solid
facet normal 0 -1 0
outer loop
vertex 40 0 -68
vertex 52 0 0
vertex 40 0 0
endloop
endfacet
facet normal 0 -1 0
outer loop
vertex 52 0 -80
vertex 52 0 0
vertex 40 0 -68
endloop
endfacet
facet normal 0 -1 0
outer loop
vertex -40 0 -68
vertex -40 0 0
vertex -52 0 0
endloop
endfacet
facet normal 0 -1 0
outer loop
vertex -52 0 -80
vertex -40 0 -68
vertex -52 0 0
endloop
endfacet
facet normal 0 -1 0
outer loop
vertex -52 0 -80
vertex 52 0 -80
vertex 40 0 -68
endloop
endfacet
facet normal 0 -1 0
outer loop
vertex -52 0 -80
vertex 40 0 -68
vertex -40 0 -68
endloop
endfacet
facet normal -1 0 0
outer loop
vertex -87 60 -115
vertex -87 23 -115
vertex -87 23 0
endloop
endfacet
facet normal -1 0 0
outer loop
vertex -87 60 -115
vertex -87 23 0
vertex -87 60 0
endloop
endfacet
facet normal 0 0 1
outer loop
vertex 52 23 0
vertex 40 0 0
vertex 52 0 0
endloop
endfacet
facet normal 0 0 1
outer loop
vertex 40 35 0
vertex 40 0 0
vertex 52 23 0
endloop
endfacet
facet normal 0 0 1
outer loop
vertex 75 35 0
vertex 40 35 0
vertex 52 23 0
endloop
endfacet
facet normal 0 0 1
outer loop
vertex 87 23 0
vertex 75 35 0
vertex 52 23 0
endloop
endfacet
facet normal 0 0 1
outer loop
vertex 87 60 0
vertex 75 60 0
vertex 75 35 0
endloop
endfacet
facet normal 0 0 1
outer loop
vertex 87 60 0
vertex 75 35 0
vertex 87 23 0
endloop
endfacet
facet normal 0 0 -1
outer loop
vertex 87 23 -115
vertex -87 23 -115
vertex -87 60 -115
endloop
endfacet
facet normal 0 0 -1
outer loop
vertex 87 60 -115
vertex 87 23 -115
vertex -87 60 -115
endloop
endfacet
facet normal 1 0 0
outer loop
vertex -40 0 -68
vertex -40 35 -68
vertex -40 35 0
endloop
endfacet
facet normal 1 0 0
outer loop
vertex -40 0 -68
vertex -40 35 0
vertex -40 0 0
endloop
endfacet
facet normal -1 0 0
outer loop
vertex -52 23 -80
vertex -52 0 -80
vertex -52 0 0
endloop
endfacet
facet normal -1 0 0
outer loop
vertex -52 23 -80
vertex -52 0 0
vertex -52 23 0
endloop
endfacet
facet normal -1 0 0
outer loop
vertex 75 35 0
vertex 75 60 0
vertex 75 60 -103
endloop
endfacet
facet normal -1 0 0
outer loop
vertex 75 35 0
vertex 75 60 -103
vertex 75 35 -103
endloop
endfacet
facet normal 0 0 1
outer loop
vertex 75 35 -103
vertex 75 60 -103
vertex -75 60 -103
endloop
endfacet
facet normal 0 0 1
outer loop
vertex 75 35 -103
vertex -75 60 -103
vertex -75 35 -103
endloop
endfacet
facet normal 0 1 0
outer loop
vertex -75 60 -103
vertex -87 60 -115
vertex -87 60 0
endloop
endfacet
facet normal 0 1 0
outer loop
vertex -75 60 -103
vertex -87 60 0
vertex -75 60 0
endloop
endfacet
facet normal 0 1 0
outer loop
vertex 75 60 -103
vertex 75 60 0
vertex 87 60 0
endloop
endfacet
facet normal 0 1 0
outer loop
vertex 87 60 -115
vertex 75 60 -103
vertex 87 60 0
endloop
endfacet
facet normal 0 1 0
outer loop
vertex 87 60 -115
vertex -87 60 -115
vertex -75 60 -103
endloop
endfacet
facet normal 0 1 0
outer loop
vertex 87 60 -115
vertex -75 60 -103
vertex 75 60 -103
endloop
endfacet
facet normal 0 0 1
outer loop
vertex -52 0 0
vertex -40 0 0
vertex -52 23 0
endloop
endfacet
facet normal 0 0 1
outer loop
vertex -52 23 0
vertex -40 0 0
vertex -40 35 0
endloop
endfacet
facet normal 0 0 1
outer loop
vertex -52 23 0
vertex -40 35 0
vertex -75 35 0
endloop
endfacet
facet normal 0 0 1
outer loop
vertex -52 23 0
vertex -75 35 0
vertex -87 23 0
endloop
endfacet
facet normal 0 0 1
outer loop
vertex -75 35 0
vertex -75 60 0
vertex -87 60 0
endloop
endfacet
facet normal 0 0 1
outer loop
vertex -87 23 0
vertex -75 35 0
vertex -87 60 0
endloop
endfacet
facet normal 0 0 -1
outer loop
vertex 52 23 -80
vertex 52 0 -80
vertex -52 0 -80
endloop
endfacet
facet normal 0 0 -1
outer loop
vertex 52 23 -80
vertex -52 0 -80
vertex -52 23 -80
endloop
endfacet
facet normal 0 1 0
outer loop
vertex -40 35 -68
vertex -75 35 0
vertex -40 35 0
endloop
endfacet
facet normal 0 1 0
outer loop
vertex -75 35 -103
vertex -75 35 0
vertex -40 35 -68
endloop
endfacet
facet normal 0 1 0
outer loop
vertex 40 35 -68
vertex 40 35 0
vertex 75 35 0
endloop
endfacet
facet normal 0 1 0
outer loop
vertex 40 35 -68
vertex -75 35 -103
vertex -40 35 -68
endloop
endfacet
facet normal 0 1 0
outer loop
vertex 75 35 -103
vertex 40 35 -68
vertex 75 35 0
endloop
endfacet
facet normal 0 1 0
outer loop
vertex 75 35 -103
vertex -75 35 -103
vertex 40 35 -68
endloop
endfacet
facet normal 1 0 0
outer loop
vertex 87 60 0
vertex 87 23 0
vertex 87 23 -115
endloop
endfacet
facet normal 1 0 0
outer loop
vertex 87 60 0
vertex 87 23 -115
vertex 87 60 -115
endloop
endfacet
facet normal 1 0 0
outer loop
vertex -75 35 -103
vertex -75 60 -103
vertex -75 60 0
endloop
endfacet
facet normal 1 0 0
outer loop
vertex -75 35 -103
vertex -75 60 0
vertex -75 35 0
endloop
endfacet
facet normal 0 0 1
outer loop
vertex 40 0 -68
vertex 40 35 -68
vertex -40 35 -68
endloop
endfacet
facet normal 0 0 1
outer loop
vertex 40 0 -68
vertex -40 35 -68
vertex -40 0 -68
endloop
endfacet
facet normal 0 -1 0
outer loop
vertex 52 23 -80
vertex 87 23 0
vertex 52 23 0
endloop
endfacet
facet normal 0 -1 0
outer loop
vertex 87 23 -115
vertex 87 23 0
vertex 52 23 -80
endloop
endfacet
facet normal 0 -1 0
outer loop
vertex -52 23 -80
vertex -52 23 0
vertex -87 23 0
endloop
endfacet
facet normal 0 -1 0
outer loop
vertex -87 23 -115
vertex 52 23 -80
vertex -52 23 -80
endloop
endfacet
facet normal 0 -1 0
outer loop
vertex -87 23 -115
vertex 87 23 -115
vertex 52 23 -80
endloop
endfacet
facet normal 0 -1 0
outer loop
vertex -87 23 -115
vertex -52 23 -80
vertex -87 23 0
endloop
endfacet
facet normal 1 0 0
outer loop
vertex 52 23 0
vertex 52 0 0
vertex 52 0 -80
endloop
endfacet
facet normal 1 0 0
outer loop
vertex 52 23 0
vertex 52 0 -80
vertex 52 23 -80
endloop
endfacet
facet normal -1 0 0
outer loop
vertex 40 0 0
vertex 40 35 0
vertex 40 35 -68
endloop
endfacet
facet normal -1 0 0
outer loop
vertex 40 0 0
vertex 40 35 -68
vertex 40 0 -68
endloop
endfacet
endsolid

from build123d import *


with BuildPart() as part:
    # Sweep1: sweep along a path in Sketch2
    with BuildLine(Plane(origin=(0, 0, 0), x_dir=(1, 0, 0), z_dir=(0, 1, 0))) as sweep1_path:
        Line((-40, 0), (-40, 68))
        Line((-40, 68), (40, 68))
        Line((40, 68), (40, 0))
    # Sketch3 → Sweep1 (sweep)
    with BuildSketch(Plane.XY):
        Polygon((40, 0), (40, 35), (75, 35), (75, 60), (87, 60), (87, 23), (52, 23), (52, 0), align=None)
    sweep(path=sweep1_path.line, transition=Transition.RIGHT)


solid = part.part
